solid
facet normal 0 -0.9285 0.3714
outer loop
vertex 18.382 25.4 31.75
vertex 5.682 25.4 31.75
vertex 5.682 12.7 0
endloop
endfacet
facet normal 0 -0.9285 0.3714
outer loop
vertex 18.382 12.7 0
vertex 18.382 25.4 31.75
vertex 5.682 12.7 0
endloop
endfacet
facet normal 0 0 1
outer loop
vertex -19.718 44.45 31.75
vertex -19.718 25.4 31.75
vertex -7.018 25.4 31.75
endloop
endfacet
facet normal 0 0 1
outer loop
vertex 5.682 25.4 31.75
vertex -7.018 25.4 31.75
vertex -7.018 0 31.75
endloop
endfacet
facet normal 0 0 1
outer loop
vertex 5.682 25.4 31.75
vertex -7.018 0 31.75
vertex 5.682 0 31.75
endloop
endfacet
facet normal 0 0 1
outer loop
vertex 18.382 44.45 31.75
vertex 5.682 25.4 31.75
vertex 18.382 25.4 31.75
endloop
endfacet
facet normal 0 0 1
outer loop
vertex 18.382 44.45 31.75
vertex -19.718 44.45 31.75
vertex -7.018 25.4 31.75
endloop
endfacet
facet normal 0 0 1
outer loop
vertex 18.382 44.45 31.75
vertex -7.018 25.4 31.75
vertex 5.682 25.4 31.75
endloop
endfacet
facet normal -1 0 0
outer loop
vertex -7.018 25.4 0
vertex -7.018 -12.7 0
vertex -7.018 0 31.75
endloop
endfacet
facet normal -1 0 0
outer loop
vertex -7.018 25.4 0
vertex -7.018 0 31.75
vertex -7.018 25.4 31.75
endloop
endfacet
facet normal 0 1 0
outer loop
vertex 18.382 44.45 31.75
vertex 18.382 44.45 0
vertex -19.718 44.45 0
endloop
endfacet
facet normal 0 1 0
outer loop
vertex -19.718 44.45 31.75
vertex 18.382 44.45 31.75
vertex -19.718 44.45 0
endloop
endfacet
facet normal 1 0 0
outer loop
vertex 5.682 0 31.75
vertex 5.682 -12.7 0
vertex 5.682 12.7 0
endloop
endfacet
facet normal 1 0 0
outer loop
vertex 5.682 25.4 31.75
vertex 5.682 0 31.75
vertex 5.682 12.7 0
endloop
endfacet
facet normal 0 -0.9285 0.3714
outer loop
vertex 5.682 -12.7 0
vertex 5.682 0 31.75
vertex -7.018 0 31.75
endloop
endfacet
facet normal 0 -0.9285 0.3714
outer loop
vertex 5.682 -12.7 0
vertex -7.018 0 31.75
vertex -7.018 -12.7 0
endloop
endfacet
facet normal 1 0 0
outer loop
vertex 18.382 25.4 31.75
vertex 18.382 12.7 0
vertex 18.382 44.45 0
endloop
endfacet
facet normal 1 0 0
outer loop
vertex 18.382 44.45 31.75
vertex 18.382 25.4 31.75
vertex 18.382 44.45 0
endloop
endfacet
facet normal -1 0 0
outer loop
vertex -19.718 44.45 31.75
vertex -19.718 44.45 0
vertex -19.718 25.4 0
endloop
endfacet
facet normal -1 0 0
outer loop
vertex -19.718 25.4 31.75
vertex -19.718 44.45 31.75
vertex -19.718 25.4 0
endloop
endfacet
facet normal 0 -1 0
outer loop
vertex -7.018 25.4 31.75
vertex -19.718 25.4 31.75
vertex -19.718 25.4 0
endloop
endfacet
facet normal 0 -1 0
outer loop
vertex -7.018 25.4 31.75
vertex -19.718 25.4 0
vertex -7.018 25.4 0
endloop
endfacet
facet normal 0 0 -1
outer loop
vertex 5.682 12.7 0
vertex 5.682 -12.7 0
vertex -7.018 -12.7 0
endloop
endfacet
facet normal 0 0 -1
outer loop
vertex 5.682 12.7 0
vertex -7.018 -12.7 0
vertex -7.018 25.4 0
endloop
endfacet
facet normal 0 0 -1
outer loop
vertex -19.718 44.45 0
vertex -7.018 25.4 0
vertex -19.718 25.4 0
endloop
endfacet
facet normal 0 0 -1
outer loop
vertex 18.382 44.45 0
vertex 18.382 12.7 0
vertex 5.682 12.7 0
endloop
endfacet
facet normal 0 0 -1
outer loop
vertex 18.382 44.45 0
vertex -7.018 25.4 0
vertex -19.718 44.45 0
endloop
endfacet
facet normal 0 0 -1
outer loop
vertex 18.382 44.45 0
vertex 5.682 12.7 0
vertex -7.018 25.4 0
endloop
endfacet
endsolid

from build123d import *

# Parameters (mm, degrees)
F1_DEPTH = 31.75
F3_DEPTH = 12.7
F5_DEPTH = 12.7


with BuildPart() as f1:
    # F0 (on Top) → F1 (new body)
    with BuildSketch(Plane.XY):
        Polygon((18.381578, 44.45), (-19.718422, 44.45), (-19.718422, 25.4), (-7.018422, 25.4), (-7.018422, 0), (5.681578, 0), (5.681578, 25.4), (18.381578, 25.4), align=None)
    extrude(amount=F1_DEPTH)

    # F2 (on face) → F3 (join)
    with BuildSketch(Plane.YZ.offset(5.681578)):
        Polygon((12.7, 0), (25.4, 0), (25.4, 31.75), align=None)
    extrude(amount=F3_DEPTH)

    # F4 (on face) → F5 (join)
    with BuildSketch(Plane.YZ.offset(5.681578)):
        Polygon((-12.7, 0), (0, 0), (0, 31.75), align=None)
    extrude(amount=-F5_DEPTH)


solid = f1.part
